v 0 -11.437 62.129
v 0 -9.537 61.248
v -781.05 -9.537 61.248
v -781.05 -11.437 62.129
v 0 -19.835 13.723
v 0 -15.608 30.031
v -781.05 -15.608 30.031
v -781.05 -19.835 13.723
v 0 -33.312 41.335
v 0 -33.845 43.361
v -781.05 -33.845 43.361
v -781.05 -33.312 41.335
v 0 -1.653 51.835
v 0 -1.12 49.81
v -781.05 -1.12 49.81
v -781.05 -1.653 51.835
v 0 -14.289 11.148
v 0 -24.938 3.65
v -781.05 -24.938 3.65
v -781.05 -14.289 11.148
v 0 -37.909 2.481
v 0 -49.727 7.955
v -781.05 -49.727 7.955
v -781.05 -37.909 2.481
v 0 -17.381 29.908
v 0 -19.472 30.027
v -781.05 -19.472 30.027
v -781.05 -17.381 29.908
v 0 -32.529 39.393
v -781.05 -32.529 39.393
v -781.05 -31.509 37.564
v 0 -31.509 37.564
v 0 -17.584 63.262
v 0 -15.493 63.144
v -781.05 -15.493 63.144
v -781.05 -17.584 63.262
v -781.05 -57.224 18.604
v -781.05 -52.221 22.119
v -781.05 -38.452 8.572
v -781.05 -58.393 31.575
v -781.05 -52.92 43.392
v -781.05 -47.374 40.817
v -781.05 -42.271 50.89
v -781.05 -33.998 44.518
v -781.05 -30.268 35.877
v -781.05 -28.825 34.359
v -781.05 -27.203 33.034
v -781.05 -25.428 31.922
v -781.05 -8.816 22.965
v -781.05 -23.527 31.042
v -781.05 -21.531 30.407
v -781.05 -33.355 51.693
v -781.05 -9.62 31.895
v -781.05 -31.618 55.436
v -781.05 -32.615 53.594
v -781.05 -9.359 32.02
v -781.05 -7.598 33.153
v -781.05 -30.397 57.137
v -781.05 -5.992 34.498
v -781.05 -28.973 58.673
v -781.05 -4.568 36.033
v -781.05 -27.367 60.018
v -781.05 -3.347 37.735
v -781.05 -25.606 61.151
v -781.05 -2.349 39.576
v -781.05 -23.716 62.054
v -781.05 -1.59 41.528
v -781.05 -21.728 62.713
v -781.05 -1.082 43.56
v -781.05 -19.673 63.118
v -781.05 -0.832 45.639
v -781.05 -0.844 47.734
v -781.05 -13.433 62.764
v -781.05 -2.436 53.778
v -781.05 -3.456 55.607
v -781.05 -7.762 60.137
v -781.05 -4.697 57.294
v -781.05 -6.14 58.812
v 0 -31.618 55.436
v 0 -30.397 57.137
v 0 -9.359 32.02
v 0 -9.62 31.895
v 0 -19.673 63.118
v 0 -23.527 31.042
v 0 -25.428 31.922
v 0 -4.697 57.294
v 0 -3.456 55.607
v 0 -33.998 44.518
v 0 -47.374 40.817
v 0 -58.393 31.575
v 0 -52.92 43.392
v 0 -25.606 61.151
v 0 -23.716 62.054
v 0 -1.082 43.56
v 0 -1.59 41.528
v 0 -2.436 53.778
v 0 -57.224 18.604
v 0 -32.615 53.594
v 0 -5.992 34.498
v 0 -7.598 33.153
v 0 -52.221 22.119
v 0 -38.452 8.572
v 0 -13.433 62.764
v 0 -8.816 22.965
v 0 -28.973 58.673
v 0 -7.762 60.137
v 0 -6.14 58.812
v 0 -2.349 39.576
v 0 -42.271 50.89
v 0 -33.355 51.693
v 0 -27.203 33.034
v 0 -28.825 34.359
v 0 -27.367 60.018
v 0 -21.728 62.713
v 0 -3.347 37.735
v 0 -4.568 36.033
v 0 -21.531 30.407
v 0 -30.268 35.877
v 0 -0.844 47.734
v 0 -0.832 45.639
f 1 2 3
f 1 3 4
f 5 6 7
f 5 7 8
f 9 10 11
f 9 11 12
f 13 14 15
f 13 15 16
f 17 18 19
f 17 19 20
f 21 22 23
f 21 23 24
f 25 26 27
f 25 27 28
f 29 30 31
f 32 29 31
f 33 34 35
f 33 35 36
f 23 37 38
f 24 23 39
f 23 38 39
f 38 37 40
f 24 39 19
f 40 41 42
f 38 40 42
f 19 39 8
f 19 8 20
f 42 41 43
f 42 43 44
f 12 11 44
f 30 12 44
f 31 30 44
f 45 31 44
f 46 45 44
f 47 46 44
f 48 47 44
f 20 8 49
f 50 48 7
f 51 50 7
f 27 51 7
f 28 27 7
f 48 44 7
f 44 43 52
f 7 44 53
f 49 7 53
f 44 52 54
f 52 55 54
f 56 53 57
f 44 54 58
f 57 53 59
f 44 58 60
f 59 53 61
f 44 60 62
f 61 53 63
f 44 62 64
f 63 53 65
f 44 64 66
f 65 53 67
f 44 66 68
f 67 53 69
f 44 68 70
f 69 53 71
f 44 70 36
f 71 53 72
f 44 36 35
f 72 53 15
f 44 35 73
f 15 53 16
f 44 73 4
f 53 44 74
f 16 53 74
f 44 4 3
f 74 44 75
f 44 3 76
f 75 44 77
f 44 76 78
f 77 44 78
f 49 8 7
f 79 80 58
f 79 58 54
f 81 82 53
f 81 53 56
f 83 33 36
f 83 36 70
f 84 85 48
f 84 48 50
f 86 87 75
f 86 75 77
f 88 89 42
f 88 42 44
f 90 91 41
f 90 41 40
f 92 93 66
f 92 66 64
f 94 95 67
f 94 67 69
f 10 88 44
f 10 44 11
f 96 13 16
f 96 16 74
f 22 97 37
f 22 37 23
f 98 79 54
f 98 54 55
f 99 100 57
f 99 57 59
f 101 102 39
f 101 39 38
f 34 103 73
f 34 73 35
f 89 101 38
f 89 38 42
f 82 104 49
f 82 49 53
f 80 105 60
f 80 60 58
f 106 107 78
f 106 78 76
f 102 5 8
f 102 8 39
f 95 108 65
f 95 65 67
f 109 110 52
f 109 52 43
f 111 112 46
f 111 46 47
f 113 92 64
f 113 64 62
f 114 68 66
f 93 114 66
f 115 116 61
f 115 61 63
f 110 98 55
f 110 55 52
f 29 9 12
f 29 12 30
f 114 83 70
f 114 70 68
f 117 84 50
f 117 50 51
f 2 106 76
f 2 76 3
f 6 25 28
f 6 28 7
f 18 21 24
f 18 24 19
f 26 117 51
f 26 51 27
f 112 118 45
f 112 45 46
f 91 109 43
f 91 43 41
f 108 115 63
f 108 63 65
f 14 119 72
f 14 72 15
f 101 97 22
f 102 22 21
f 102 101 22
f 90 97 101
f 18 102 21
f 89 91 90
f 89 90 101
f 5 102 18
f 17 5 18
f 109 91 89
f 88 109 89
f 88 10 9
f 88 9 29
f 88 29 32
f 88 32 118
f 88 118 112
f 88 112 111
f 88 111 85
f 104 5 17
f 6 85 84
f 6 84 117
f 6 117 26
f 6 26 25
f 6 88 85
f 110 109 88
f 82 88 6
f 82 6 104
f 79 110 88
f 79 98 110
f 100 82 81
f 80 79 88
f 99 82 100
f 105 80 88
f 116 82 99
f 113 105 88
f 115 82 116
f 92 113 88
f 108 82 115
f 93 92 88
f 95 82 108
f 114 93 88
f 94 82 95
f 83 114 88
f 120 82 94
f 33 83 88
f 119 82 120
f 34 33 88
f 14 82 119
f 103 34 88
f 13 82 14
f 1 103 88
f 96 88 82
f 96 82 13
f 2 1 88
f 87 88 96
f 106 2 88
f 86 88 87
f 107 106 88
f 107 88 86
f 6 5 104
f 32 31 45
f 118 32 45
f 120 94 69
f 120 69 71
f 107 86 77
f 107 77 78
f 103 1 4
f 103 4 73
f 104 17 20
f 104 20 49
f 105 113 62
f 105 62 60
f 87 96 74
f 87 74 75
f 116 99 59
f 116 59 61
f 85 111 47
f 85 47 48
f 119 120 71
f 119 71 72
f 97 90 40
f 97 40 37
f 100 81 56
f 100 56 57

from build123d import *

# Parameters (mm, degrees)
F1_DEPTH = 781.05


with BuildPart() as f1:
    # F0 (on Right) → F1 (new body)
    with BuildSketch(Plane.YZ):
        Polygon((-57.224485, 18.603526), (-49.726797, 7.954637), (-37.909164, 2.481273), (-24.938112, 3.650017), (-14.289223, 11.147705), (-8.815859, 22.965337), (-9.620451, 31.894936), (-11.24866, 31.116622), (-13.236551, 30.457316), (-15.291399, 30.052357), (-15.607873, 30.030512), (-19.835498, 13.723182), (-38.451873, 8.572227), (-52.220918, 22.119002), (-47.373589, 40.816733), (-33.998333, 44.517526), (-34.120155, 45.436821), (-34.1329, 47.531154), (-33.883056, 49.610571), (-33.374561, 51.642276), (-33.354722, 51.693289), (-42.270976, 50.889899), (-52.919864, 43.392211), (-58.393229, 31.574578), align=None)
        Polygon((-17.3808, 29.908133), (-15.607873, 30.030512), (-14.988169, 32.420913), (-28.757215, 45.967688), (-33.998333, 44.517526), (-33.845021, 43.3606), (-33.311836, 41.335233), (-32.52901, 39.392663), (-31.508889, 37.563525), (-30.26756, 35.876666), (-28.824599, 34.358687), (-27.202763, 33.033529), (-25.42763, 31.922091), (-23.527194, 31.041899), (-21.531426, 30.406836), (-19.471801, 30.026917), align=None)
        Polygon((-32.615436, 53.59423), (-33.354722, 51.693289), (-29.299923, 52.058643), (-17.482291, 46.585278), (-9.984603, 35.936389), (-9.620451, 31.894936), (-9.359077, 32.019878), (-7.597603, 33.152839), (-5.992015, 34.497638), (-4.567636, 36.033066), (-3.346929, 37.734908), (-2.349145, 39.576327), (-1.59002, 41.52828), (-1.081526, 43.559986), (-0.831681, 45.639402), (-0.844426, 47.733735), (-1.119561, 49.809957), (-1.652745, 51.835323), (-2.435571, 53.777893), (-3.455692, 55.607031), (-4.697022, 57.293891), (-6.139982, 58.811869), (-7.761818, 60.137027), (-9.536951, 61.248466), (-11.437388, 62.128657), (-13.433155, 62.76372), (-15.492781, 63.14364), (-17.583781, 63.262424), (-19.673182, 63.118199), (-21.72803, 62.713241), (-23.715921, 62.053935), (-25.605504, 61.150679), (-27.366979, 60.017718), (-28.972566, 58.672919), (-30.396945, 57.137491), (-31.617652, 55.435648), align=None)
        Polygon((-29.299923, 52.058643), (-33.354722, 51.693289), (-33.374561, 51.642276), (-33.883056, 49.610571), (-34.1329, 47.531154), (-34.120155, 45.436821), (-33.998333, 44.517526), (-28.757215, 45.967688), (-14.988169, 32.420913), (-15.607873, 30.030512), (-15.291399, 30.052357), (-13.236551, 30.457316), (-11.24866, 31.116622), (-9.620451, 31.894936), (-9.984603, 35.936389), (-17.482291, 46.585278), align=None)
    extrude(amount=-F1_DEPTH)


solid = f1.part
